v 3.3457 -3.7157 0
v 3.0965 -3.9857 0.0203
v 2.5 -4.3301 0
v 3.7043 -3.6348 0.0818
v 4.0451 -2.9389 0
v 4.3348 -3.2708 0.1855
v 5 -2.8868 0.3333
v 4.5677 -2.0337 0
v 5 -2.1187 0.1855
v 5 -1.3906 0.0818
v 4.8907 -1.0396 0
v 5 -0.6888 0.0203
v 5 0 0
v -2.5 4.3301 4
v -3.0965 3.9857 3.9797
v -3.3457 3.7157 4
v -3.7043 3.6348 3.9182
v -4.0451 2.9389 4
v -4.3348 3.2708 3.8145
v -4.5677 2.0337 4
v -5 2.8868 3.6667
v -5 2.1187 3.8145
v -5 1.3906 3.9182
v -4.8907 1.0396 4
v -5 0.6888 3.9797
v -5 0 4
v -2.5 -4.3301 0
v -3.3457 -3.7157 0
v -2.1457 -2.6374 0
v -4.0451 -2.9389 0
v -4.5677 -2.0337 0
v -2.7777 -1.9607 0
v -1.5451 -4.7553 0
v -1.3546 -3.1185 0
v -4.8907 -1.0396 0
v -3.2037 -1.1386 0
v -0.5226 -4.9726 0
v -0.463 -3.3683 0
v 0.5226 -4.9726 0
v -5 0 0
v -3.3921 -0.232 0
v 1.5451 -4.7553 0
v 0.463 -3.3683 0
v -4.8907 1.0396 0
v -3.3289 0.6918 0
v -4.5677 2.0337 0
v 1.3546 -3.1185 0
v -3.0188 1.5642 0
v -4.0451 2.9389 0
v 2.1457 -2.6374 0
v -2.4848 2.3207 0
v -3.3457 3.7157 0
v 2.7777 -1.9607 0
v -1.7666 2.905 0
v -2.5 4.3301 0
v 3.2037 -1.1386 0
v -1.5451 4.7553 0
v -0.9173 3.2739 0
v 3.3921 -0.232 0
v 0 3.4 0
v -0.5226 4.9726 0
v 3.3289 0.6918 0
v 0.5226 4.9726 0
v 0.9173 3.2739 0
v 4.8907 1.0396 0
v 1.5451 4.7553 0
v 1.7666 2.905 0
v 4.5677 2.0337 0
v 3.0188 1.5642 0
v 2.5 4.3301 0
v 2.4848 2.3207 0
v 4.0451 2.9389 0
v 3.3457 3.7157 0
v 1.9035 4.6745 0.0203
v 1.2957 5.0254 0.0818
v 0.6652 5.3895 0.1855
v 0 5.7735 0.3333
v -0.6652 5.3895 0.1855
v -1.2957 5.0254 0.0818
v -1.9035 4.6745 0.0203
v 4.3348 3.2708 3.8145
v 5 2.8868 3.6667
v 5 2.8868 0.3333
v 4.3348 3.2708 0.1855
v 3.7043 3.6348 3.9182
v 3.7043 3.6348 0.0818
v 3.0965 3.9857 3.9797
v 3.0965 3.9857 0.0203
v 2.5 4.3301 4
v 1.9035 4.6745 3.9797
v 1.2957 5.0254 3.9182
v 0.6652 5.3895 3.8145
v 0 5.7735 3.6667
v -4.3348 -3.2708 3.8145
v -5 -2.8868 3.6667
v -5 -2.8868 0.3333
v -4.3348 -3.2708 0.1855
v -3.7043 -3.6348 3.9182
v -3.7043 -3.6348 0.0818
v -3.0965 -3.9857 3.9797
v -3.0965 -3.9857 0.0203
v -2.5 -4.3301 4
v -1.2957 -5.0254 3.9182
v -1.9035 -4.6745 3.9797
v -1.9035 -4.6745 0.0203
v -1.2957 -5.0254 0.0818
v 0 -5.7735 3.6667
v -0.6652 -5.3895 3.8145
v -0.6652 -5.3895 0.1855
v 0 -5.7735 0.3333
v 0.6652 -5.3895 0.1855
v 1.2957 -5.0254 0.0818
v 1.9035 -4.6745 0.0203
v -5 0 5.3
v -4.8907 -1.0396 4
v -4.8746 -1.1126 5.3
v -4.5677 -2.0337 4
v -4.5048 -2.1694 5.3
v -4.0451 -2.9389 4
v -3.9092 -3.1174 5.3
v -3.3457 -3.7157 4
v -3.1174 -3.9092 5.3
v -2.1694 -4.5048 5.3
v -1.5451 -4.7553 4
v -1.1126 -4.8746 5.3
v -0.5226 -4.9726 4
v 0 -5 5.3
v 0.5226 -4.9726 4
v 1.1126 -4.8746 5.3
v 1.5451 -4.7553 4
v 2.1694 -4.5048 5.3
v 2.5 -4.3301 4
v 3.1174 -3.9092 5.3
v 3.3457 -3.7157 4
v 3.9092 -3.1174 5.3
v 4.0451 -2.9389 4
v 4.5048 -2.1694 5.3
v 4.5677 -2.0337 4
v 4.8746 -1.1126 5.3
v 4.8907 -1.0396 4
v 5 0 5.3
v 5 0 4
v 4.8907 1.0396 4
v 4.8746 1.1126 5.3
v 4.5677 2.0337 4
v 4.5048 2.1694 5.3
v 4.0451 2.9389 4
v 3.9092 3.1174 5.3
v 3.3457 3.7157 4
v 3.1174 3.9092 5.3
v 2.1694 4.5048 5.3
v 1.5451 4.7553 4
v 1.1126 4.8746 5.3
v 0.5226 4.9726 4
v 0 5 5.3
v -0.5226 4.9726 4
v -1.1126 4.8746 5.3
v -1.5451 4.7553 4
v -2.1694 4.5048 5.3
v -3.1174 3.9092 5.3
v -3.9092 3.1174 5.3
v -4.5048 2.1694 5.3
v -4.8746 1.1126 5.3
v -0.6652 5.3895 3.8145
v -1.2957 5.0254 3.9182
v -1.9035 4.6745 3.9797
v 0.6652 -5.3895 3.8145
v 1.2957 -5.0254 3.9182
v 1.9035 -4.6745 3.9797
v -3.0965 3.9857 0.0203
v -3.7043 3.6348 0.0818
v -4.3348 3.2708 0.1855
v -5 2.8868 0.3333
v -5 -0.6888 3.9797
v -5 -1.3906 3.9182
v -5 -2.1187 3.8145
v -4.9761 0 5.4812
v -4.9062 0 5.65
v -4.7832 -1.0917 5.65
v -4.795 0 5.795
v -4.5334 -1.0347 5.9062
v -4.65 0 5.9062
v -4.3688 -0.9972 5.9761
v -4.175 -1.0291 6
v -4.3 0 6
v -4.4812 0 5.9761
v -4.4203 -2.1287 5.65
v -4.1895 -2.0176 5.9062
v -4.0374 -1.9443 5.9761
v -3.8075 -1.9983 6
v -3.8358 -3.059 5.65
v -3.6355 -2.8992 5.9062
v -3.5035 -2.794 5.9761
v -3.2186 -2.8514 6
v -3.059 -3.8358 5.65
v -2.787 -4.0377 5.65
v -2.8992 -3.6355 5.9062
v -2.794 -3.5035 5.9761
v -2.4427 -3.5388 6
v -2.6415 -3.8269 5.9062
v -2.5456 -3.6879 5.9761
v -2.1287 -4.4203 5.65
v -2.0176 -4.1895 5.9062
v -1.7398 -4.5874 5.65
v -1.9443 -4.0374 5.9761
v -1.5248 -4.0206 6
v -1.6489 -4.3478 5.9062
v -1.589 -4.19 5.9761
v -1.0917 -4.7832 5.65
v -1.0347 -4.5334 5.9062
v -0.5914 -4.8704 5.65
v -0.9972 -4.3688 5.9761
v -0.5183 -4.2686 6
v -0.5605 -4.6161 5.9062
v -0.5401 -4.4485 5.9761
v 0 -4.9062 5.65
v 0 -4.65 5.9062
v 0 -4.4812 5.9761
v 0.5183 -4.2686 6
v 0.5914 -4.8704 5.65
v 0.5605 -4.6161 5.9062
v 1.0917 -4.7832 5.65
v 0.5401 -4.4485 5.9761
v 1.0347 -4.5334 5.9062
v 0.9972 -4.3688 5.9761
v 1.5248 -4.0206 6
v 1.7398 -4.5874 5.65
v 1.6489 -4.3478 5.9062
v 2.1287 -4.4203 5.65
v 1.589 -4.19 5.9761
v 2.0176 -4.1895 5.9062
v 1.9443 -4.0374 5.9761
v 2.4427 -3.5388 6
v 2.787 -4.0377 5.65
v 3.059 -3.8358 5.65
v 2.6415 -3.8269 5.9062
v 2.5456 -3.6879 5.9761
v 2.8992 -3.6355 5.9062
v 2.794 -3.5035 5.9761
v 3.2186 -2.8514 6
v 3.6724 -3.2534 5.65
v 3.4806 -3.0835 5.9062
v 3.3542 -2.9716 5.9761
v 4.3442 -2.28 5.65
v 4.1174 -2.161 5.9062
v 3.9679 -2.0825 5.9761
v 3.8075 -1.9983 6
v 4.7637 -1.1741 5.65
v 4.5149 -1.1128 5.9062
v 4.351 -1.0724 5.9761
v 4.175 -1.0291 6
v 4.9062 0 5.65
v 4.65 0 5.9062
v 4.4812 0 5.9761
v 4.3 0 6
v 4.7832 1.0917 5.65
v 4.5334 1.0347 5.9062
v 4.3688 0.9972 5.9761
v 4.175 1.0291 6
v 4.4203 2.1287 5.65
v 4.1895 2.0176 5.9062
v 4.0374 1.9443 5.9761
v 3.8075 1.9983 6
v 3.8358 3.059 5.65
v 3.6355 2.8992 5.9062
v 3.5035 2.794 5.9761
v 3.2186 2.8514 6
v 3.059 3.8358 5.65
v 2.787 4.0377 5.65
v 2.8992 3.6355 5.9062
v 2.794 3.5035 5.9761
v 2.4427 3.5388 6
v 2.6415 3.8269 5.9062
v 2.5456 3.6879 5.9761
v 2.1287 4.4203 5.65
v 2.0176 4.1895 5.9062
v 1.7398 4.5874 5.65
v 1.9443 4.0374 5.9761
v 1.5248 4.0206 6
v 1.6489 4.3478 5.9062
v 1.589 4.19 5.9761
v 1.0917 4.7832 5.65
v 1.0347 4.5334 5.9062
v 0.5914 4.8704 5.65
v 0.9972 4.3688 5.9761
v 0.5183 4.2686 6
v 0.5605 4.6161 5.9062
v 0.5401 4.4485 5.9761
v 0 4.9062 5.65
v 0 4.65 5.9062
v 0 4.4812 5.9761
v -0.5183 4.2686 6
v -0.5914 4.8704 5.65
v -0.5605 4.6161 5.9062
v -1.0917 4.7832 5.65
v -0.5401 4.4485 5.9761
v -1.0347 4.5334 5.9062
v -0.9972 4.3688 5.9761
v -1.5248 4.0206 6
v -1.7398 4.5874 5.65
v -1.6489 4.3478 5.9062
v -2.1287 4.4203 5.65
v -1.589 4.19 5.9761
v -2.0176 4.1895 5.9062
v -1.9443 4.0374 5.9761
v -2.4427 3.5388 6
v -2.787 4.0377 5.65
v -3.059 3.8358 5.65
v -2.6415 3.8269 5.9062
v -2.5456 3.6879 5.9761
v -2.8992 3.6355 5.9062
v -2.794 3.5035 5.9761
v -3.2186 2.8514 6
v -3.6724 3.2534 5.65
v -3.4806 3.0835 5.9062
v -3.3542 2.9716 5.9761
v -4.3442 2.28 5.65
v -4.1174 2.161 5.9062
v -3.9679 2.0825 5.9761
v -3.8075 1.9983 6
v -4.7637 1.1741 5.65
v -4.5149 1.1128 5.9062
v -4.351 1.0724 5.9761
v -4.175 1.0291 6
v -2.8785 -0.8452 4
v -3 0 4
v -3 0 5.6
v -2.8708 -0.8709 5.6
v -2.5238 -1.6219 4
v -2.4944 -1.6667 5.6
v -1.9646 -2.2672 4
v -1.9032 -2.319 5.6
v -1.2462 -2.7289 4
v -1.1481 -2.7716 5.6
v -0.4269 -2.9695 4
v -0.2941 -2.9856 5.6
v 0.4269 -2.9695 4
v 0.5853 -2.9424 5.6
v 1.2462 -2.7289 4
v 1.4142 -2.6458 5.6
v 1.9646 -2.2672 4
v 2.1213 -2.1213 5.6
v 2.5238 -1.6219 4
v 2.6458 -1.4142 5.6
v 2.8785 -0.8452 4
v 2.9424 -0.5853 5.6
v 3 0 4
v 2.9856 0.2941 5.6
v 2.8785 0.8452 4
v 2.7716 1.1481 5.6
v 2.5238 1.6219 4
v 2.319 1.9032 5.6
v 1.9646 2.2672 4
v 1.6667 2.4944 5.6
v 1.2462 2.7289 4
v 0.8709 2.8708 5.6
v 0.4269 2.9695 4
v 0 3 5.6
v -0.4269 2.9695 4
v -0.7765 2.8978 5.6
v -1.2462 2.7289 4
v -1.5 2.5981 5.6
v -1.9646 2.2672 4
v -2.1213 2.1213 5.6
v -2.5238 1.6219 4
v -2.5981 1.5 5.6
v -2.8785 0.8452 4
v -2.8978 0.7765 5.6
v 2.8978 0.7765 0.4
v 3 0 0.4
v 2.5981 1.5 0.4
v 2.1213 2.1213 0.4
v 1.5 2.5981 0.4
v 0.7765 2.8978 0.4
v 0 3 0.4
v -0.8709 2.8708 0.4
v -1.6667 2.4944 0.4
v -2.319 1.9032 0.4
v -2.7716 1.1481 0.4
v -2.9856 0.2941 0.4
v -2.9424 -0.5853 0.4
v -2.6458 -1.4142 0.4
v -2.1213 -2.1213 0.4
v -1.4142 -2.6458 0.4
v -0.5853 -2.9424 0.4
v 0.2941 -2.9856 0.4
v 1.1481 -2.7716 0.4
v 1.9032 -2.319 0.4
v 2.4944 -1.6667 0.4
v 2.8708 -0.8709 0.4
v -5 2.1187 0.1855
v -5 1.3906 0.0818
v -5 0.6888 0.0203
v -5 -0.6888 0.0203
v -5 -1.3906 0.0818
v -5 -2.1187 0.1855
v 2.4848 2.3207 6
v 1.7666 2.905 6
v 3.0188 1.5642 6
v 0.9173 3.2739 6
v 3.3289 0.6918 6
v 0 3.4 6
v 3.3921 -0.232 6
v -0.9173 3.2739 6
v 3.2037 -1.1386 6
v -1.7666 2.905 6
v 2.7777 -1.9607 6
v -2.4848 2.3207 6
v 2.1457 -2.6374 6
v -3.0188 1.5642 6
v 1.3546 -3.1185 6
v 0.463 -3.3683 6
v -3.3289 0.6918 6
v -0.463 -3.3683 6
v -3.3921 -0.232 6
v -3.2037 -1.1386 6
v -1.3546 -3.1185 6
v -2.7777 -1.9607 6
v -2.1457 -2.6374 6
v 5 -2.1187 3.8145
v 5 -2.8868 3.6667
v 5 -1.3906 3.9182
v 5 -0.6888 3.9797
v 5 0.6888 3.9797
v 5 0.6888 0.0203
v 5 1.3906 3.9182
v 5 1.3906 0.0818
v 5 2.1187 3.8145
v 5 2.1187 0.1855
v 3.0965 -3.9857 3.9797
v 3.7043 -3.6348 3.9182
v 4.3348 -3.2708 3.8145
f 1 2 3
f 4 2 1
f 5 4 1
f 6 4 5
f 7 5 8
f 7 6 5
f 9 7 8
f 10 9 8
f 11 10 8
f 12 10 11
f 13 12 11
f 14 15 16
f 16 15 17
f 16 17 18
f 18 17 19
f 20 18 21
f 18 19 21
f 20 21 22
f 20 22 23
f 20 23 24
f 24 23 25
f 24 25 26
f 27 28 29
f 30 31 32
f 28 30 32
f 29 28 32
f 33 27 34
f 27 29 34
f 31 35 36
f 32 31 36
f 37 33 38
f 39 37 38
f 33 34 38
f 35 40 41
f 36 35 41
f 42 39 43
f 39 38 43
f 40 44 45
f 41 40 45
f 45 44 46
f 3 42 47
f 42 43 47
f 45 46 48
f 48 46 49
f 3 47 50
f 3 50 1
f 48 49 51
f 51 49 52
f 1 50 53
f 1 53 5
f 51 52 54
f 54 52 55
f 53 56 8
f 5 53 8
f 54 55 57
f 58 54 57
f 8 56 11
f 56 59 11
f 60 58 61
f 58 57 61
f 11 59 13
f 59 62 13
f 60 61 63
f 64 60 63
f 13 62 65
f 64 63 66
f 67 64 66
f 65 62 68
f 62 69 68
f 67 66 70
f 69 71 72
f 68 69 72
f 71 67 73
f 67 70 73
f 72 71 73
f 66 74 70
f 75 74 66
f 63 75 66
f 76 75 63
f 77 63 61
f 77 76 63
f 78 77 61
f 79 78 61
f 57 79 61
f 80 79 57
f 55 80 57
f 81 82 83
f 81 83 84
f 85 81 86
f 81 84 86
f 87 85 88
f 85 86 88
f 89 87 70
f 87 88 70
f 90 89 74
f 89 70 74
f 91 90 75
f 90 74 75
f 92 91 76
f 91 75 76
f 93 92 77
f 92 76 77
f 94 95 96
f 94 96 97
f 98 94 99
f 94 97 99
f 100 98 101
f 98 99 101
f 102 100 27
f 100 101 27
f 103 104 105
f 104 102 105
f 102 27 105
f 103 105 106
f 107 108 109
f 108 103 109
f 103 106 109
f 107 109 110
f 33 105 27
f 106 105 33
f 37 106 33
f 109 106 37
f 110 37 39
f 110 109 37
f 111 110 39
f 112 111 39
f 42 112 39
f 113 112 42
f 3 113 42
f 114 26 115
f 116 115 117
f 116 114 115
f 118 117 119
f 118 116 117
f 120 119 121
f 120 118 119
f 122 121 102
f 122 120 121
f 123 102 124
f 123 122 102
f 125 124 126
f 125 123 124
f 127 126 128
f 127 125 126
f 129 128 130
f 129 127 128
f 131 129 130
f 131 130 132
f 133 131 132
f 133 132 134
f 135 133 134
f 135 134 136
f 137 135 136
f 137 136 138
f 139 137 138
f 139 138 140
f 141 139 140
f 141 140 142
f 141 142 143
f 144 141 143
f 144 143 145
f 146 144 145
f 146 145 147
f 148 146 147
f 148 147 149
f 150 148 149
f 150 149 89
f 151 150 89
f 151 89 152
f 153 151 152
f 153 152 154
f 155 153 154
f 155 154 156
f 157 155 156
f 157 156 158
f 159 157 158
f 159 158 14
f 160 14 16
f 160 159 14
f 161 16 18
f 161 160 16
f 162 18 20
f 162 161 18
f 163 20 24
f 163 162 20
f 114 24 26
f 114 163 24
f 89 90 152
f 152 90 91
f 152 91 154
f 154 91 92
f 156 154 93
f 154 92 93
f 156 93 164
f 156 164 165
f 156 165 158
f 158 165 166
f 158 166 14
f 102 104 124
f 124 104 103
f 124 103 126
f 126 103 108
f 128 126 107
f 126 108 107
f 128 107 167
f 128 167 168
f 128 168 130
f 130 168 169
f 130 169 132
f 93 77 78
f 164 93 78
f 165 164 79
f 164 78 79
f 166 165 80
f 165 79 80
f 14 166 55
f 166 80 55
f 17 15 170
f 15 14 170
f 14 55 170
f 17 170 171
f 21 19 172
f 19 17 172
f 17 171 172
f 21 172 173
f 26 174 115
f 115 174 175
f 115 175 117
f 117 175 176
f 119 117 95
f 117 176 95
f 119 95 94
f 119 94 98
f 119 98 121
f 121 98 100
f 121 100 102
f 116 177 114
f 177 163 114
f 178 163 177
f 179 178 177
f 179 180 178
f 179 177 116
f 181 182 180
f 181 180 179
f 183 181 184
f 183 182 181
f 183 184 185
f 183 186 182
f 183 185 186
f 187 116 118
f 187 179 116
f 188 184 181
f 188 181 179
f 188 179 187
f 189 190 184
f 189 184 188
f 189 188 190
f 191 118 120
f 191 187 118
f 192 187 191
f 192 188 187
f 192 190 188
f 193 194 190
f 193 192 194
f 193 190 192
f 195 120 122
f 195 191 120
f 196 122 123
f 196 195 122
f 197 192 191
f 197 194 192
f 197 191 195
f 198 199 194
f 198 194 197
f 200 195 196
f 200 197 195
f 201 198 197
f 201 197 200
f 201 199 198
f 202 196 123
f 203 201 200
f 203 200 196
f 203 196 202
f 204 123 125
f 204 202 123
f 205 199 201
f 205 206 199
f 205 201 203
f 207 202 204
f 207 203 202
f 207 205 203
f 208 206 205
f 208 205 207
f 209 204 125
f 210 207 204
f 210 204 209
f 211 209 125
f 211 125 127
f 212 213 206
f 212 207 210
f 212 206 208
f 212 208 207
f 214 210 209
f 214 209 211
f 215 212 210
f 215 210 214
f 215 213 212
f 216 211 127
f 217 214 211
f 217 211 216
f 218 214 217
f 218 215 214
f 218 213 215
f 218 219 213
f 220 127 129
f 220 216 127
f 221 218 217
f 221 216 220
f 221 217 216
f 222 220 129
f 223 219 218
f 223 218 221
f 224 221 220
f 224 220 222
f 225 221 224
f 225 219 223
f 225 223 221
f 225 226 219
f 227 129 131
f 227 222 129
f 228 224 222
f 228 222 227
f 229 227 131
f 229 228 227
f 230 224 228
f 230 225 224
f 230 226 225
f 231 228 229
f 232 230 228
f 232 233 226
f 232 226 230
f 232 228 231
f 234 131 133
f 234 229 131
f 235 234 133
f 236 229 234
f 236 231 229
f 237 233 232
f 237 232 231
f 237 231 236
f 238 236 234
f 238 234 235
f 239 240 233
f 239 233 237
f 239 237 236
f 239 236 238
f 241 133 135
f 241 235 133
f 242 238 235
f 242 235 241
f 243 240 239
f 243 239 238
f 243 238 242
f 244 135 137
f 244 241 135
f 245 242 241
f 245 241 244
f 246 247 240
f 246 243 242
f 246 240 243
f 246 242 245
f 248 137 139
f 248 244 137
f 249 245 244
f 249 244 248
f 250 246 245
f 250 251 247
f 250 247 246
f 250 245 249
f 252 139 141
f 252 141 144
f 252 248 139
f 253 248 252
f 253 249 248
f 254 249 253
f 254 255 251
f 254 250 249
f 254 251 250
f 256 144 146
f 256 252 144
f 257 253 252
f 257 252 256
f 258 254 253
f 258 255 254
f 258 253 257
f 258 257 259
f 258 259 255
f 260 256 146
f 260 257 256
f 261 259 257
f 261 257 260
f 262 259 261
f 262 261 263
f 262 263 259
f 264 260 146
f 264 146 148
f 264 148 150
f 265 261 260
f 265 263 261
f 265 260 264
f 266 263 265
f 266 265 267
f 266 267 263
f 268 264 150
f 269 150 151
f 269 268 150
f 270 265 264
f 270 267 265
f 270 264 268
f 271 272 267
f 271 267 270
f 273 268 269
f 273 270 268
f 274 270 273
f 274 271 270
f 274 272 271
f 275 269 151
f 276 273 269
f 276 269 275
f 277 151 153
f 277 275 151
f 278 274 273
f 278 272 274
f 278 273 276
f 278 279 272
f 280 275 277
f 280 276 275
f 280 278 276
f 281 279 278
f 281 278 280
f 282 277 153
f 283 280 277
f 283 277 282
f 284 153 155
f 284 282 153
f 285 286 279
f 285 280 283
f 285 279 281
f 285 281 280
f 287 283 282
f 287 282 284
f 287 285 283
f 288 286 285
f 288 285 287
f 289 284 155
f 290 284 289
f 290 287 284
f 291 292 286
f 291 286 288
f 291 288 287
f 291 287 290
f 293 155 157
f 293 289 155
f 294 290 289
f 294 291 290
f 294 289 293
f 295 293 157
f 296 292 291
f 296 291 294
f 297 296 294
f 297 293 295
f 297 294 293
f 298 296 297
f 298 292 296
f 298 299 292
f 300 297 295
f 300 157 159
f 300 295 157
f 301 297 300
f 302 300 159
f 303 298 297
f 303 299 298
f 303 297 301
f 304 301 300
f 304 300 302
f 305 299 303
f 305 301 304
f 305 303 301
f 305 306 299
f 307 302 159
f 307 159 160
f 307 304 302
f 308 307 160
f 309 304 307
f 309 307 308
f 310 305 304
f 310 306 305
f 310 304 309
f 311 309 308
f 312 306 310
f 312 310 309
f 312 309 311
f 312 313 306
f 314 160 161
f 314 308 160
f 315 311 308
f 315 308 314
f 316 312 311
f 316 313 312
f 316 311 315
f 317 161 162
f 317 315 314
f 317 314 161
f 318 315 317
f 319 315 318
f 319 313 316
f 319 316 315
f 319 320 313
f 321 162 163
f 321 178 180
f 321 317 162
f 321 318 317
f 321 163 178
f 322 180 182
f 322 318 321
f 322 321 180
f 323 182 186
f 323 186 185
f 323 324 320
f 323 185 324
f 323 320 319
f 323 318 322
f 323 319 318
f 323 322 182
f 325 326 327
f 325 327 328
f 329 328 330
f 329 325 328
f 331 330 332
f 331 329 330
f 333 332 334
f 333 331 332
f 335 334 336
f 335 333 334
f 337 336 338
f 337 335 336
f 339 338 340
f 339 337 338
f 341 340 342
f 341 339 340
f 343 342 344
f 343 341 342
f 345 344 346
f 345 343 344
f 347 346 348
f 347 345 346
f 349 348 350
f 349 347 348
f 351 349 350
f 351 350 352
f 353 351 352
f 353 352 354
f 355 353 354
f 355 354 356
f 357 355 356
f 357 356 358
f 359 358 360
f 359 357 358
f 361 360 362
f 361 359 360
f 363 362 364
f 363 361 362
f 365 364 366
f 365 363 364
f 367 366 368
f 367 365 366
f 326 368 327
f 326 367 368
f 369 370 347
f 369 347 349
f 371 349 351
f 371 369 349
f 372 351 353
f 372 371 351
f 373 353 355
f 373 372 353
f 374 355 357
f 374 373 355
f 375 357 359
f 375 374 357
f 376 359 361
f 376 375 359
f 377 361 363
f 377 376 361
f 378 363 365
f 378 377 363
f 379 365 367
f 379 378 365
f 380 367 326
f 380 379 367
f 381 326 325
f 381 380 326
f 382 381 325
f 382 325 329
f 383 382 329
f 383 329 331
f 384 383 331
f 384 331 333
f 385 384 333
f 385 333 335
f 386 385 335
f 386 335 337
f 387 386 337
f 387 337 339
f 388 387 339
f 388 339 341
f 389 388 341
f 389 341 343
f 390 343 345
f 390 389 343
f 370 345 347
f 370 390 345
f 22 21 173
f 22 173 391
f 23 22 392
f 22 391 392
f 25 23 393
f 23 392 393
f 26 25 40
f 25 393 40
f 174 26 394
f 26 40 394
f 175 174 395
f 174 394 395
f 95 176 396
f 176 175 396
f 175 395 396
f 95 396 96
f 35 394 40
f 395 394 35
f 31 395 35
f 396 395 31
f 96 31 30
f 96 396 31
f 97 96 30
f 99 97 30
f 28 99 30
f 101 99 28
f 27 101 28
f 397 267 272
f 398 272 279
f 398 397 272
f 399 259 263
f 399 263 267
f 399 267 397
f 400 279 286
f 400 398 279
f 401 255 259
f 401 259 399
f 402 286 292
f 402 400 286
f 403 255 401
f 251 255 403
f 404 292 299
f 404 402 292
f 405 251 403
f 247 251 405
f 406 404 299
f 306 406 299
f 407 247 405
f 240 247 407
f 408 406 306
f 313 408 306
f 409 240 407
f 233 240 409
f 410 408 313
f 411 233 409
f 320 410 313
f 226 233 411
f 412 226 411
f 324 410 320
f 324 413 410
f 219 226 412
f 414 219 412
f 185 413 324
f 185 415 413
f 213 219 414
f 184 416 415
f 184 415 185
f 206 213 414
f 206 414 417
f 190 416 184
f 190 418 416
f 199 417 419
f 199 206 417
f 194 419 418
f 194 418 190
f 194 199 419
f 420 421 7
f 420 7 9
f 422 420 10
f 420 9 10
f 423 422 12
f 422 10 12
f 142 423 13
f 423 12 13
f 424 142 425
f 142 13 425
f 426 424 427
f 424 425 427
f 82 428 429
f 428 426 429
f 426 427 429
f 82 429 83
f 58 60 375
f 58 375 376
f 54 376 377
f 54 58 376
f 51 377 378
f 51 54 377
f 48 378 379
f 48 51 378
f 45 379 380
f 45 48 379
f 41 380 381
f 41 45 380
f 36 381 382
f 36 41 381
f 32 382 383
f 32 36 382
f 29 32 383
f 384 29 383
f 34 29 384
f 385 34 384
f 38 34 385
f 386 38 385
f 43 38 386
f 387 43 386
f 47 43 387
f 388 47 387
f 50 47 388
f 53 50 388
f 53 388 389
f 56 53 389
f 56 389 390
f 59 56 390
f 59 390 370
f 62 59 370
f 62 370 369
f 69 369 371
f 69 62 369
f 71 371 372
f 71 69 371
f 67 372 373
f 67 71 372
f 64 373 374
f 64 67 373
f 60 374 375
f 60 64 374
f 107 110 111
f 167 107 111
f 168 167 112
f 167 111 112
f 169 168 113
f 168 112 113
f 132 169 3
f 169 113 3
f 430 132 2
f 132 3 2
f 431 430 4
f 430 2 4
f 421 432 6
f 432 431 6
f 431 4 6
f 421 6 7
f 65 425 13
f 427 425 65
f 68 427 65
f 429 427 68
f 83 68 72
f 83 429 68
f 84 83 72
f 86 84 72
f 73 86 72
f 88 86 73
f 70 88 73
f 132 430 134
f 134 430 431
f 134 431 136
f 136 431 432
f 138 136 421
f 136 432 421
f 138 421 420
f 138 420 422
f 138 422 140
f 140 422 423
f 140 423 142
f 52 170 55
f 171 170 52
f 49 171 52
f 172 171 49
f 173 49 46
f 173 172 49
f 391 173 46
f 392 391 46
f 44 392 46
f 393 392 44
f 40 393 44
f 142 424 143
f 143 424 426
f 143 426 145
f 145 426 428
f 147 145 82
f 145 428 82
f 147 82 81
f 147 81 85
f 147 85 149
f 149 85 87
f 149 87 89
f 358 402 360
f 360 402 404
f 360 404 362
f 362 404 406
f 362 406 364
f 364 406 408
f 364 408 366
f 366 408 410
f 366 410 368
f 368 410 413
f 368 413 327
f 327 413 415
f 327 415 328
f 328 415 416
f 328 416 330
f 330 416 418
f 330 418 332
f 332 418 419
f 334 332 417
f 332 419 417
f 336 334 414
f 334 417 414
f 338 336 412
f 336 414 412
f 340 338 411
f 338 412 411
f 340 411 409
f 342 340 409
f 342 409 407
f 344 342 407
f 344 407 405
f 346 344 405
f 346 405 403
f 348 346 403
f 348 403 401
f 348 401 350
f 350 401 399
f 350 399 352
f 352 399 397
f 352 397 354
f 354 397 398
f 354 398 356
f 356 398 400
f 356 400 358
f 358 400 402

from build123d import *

# Parameters (mm, degrees)
SKETCH1_R           = 3
BOSS_EXTRUDE1_DEPTH = 4


with BuildPart() as part:
    # Sketch1 → Boss-Extrude1 (new body)
    with BuildSketch(Plane.XY):
        Polygon((0, -5.773502692), (5, -2.886751346), (5, 2.886751346), (0, 5.773502692), (-5, 2.886751346), (-5, -2.886751346), align=None)
        Circle(SKETCH1_R, mode=Mode.SUBTRACT)
    extrude(amount=BOSS_EXTRUDE1_DEPTH)

    # Sketch3 → Revolve1 (revolve)
    with BuildSketch(Plane(origin=(0, 0, 0), x_dir=(0, 0, -1), z_dir=(0, 1, 0))):
        with BuildLine():
            Line((-4, 5), (-5.3, 5))
            ThreePointArc((-5.3, 5), (-5.794974747, 4.794974747), (-6, 4.3))
            Line((-6, 4.3), (-6, 3))
            Line((-6, 3), (-4, 3))
            Line((-4, 3), (-4, 5))
        make_face()
    revolve(axis=Axis((0, 0, 0), (0, 0, 1)))

    # Sketch2 → Cut-Revolve1 (revolve, cut)
    with BuildSketch(Plane(origin=(0, 0, 0), x_dir=(0, 0, -1), z_dir=(1, 0, 0))):
        Polygon((-4, 5.773502692), (-4, 5), (-3.666666667, 5.773502692), align=None)
        Polygon((-0.333333333, 5.773502692), (0, 5.773502692), (0, 5), align=None)
        Polygon((-6, 3), (-5.6, 3), (-6, 3.4), align=None)
        Polygon((0, 3), (-0.4, 3), (0, 3.4), align=None)
    revolve(axis=Axis((0, 0, 0), (0, 0, 1)), mode=Mode.SUBTRACT)


solid = part.part
